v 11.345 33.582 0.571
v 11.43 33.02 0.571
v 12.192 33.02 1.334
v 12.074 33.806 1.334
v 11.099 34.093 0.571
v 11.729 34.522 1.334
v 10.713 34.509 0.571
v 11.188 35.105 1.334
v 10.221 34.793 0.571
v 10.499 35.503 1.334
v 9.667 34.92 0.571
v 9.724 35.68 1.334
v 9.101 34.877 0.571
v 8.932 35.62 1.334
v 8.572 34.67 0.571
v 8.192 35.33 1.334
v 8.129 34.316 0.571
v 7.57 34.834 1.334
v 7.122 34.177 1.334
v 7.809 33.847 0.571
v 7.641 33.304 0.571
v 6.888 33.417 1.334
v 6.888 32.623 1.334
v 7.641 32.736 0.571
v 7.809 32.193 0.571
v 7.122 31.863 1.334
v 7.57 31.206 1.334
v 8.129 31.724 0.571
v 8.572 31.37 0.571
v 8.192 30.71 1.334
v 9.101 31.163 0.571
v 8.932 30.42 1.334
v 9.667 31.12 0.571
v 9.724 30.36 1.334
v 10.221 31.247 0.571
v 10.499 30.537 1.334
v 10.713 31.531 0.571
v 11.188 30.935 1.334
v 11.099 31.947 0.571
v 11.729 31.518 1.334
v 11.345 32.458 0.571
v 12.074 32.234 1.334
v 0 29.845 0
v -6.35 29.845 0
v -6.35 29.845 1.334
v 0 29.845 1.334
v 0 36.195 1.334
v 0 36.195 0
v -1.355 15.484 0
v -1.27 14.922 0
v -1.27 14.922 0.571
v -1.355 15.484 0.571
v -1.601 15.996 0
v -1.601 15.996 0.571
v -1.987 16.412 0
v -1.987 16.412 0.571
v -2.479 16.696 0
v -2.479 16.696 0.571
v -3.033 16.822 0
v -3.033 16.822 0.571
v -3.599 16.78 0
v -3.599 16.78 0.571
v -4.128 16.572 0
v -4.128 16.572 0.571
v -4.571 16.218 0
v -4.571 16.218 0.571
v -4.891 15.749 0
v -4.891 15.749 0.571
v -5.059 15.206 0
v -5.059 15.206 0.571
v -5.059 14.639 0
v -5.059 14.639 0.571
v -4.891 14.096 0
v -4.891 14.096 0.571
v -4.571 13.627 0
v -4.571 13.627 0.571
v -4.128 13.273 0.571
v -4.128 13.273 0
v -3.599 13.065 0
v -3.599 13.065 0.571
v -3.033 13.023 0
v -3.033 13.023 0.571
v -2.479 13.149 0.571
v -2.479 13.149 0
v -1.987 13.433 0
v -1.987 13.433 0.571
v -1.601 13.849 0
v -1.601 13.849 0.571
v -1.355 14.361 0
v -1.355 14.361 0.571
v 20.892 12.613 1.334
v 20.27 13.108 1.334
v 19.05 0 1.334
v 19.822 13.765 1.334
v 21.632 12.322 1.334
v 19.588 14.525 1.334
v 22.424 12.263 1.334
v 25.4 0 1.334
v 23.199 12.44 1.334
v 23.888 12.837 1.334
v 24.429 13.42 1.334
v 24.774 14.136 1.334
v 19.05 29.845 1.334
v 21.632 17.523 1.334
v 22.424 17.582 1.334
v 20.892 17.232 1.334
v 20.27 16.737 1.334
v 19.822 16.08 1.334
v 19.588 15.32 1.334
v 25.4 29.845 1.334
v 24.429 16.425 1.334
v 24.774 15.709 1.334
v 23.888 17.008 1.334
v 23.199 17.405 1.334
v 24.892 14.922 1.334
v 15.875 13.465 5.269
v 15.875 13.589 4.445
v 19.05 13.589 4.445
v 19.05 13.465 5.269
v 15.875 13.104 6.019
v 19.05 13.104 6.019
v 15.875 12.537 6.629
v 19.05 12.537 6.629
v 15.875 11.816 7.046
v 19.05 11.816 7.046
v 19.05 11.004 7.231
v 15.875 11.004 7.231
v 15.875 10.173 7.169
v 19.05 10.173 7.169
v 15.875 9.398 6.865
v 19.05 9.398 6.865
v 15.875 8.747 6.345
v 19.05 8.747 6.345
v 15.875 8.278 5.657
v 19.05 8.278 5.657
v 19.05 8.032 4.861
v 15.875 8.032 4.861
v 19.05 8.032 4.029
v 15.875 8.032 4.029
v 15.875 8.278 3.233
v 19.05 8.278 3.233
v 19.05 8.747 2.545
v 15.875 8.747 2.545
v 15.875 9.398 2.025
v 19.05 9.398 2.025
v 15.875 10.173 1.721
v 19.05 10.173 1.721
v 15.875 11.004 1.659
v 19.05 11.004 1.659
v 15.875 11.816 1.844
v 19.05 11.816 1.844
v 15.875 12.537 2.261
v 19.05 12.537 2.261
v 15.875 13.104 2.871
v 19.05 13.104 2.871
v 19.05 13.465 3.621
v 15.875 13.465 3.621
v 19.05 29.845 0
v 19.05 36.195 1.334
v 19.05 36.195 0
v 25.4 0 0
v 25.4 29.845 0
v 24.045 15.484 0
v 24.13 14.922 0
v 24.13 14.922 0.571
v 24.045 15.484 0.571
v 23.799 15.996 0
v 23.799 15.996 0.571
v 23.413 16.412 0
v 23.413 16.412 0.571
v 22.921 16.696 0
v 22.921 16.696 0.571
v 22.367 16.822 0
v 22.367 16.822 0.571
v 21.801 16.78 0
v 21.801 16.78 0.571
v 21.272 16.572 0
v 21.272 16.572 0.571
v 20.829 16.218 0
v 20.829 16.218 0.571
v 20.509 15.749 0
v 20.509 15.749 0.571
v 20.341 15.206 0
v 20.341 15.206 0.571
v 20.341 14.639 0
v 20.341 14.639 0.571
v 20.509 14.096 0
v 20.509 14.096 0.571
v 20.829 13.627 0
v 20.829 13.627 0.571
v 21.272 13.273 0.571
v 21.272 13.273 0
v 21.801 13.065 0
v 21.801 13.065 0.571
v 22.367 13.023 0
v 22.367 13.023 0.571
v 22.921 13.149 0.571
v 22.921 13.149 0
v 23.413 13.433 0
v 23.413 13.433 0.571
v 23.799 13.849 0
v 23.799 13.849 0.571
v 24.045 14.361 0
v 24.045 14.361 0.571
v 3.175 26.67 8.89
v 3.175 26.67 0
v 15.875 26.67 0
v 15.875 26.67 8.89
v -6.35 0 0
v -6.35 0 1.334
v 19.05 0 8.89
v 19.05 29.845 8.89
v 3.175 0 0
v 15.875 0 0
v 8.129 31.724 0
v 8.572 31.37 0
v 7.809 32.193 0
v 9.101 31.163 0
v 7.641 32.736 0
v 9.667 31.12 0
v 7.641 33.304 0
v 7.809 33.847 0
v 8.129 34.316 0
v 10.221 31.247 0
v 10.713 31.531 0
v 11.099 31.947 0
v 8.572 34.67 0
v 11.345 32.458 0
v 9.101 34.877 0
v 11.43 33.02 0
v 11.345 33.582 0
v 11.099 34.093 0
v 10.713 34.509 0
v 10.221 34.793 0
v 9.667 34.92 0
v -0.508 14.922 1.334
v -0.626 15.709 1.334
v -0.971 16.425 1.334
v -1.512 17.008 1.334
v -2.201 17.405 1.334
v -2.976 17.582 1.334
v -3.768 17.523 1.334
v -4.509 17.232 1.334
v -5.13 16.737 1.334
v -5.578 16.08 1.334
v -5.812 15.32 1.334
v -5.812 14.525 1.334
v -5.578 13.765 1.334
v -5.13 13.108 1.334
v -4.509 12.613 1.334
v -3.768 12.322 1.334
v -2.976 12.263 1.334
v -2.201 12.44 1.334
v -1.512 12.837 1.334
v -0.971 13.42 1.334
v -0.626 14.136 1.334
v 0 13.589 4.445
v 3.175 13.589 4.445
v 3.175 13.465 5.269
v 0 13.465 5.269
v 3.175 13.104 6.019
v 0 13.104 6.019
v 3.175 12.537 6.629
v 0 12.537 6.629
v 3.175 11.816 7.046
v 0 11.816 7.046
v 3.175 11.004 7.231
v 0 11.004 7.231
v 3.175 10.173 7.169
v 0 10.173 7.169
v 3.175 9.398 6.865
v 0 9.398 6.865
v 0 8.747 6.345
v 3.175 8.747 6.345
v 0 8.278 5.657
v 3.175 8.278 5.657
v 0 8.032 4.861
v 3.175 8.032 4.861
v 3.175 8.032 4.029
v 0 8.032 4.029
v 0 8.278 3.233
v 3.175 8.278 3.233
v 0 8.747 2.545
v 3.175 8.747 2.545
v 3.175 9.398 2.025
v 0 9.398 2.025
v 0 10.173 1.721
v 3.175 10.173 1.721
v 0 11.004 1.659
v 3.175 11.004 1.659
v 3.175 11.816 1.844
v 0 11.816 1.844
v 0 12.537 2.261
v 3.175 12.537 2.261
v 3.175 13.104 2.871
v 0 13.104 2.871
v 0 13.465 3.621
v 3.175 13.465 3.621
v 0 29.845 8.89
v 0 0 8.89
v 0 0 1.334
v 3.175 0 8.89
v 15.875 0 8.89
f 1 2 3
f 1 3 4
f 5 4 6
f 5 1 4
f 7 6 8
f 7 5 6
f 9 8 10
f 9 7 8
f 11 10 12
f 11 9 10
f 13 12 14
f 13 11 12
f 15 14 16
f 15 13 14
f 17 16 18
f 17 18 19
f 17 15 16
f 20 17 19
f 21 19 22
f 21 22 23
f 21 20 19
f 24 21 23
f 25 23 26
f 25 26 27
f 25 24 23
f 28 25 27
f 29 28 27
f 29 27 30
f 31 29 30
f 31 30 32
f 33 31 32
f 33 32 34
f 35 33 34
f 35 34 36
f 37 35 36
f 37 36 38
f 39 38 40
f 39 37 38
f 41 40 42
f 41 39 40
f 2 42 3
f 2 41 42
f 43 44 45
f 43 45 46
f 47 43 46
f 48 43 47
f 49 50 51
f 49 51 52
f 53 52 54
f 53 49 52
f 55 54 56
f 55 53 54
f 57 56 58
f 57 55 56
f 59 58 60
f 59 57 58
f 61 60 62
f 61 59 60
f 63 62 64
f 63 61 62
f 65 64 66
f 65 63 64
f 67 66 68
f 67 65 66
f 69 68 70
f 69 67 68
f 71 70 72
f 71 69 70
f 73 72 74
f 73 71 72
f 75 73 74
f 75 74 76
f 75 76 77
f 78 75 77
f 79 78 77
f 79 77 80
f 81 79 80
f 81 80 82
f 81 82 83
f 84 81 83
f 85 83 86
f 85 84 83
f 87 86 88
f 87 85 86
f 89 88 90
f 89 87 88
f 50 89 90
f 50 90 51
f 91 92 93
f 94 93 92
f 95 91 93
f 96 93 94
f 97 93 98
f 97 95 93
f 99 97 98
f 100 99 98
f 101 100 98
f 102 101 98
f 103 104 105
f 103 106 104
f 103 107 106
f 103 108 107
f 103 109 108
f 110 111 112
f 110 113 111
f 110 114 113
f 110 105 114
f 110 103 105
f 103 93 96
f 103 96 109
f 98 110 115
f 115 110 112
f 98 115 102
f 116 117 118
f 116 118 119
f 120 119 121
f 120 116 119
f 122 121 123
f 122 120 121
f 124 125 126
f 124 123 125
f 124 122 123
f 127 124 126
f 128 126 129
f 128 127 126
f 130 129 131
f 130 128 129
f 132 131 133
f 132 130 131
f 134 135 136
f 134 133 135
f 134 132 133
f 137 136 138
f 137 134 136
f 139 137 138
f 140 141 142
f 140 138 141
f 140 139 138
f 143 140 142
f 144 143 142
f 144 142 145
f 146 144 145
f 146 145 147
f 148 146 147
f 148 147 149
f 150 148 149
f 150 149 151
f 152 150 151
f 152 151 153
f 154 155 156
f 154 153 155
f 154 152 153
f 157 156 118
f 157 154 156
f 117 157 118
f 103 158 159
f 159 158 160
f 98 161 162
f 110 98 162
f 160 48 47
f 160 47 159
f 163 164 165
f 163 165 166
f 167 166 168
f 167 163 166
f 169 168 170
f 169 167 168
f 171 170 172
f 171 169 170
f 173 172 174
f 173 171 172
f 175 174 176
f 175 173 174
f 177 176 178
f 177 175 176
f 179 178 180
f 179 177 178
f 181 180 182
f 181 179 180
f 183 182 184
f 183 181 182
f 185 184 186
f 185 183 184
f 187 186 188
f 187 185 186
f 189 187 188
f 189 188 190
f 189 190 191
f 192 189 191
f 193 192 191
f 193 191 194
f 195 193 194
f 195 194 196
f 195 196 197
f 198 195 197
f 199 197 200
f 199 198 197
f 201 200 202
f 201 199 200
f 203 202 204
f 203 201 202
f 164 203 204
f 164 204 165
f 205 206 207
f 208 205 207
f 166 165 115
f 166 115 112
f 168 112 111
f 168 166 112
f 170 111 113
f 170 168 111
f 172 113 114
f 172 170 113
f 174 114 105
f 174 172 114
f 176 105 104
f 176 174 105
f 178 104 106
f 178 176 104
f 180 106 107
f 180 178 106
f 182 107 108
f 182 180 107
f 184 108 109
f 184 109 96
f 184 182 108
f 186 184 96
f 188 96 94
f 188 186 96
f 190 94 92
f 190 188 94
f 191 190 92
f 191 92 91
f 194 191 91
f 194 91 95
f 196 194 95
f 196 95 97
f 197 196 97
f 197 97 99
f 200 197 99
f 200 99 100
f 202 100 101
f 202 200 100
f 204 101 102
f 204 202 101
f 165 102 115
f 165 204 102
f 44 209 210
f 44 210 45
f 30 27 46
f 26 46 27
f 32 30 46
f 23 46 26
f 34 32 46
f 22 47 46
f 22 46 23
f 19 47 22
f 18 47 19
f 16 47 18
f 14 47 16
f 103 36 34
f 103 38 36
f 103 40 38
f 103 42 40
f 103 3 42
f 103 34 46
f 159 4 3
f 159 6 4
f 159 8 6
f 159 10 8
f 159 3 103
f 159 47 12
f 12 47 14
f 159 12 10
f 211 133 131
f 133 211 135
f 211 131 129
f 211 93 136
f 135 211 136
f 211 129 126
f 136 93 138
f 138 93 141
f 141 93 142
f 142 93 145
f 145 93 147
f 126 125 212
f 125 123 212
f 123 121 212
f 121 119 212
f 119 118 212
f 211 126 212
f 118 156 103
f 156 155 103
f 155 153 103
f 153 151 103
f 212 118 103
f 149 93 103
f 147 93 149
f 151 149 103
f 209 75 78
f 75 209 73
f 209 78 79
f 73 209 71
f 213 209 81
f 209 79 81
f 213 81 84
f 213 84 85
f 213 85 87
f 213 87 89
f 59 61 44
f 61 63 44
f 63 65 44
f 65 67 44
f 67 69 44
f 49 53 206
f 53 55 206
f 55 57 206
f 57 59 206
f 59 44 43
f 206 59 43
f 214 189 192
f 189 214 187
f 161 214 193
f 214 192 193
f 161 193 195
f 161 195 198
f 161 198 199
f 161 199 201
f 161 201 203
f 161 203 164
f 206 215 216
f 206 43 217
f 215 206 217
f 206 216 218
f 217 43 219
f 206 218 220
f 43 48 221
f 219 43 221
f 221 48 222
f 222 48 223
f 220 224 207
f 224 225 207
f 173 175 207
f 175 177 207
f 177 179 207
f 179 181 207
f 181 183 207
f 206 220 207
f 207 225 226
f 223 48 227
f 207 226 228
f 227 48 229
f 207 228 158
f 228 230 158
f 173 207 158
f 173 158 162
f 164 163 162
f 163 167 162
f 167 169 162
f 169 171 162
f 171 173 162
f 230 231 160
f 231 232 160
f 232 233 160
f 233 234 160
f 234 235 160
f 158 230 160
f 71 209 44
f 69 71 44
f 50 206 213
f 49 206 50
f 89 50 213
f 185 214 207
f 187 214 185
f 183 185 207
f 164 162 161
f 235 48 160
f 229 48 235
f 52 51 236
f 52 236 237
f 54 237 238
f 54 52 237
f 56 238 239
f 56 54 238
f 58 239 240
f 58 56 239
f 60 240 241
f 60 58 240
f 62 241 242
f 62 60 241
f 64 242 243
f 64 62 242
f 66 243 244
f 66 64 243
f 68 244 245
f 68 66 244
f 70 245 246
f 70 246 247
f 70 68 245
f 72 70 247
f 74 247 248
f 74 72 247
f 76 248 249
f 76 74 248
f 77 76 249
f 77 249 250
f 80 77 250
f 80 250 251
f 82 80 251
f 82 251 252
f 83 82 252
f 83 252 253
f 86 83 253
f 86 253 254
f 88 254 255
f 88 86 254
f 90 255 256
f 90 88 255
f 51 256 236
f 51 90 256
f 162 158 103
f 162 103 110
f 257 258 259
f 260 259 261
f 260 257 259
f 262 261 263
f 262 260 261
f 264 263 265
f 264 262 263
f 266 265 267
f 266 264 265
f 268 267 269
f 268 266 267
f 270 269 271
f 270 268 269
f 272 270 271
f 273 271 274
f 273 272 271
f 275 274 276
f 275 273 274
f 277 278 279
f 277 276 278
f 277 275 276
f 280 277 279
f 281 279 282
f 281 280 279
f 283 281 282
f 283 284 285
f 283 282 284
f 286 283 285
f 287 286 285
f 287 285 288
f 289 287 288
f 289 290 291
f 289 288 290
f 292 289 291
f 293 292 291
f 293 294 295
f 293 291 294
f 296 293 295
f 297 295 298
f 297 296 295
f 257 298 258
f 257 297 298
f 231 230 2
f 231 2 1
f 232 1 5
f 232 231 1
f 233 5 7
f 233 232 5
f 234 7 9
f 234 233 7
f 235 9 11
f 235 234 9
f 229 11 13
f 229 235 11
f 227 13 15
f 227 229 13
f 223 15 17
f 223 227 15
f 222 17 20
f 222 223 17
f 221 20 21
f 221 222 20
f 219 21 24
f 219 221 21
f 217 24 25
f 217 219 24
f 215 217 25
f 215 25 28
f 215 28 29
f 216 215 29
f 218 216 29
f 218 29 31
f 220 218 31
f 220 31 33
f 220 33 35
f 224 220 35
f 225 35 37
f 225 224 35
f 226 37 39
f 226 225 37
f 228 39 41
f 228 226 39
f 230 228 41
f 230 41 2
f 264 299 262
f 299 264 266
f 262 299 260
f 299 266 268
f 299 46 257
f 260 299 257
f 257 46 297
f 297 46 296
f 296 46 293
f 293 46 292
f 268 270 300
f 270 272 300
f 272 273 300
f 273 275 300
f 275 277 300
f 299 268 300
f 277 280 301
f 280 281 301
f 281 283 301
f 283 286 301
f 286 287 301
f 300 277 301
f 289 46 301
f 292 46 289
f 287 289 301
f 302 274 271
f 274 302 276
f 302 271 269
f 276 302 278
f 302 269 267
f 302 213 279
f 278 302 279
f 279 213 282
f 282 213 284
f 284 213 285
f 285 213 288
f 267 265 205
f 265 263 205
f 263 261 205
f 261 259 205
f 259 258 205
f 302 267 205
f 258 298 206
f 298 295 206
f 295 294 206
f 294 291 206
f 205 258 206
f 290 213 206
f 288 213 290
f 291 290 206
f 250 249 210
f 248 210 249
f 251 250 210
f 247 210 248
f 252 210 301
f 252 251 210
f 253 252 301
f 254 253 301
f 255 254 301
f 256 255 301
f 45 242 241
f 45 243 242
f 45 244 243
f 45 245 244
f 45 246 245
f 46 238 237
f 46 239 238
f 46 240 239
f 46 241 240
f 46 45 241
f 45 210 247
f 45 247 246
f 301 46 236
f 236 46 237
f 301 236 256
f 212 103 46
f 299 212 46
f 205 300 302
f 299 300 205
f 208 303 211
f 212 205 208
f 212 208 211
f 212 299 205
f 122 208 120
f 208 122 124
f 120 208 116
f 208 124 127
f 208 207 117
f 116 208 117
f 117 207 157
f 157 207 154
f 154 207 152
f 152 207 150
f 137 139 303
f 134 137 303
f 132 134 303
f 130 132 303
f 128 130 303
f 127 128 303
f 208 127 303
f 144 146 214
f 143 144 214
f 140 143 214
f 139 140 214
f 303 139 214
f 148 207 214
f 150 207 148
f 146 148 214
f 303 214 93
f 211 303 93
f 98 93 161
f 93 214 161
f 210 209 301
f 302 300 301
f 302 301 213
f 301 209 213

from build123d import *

# Parameters (mm, degrees)
F1_DEPTH = 8.89
F2_R     = 2.794
F3_DEPTH = 20.32
F0_W     = 6.35
F0_H     = 29.845
F0_R     = 1.905
F0_W_2   = 19.05
F0_H_2   = 6.35
F4_DEPTH = 1.3335
F5_SIZE  = 0.762


with BuildPart() as f1:
    # F0 (on Top) → F1 (new body)
    with BuildSketch(Plane.XY):
        Polygon((0, 29.845), (0, 0), (3.175, 0), (3.175, 26.67), (15.875, 26.67), (15.875, 0), (19.05, 0), (19.05, 29.845), align=None)
    extrude(amount=F1_DEPTH)

    # F2 (on Right) → F3 (cut)
    with BuildSketch(Plane.YZ):
        with Locations((10.795, 4.445)):
            Circle(F2_R)
    extrude(amount=F3_DEPTH, mode=Mode.SUBTRACT)

    # F0 (on Top) → F4 (join)
    with BuildSketch(Plane.XY):
        with Locations((-3.175, 14.9225)):
            Rectangle(F0_W, F0_H)
        with Locations((-3.175, 14.9225)):
            Circle(F0_R, mode=Mode.SUBTRACT)
        with Locations((9.525, 33.02)):
            Rectangle(F0_W_2, F0_H_2)
        with Locations((9.525, 33.02)):
            Circle(F0_R, mode=Mode.SUBTRACT)
        with Locations((22.225, 14.9225)):
            Rectangle(F0_W, F0_H)
        with Locations((22.225, 14.9225)):
            Circle(F0_R, mode=Mode.SUBTRACT)
    extrude(amount=F4_DEPTH)

    # F5
    f5_edges = [f1.edges().sort_by_distance(p)[0] for p in [
        (20.32, 14.9225, 1.3335),
        (-5.08, 14.9225, 1.3335),
        (7.62, 33.02, 1.3335),
    ]]
    chamfer(f5_edges, length=F5_SIZE)


solid = f1.part
